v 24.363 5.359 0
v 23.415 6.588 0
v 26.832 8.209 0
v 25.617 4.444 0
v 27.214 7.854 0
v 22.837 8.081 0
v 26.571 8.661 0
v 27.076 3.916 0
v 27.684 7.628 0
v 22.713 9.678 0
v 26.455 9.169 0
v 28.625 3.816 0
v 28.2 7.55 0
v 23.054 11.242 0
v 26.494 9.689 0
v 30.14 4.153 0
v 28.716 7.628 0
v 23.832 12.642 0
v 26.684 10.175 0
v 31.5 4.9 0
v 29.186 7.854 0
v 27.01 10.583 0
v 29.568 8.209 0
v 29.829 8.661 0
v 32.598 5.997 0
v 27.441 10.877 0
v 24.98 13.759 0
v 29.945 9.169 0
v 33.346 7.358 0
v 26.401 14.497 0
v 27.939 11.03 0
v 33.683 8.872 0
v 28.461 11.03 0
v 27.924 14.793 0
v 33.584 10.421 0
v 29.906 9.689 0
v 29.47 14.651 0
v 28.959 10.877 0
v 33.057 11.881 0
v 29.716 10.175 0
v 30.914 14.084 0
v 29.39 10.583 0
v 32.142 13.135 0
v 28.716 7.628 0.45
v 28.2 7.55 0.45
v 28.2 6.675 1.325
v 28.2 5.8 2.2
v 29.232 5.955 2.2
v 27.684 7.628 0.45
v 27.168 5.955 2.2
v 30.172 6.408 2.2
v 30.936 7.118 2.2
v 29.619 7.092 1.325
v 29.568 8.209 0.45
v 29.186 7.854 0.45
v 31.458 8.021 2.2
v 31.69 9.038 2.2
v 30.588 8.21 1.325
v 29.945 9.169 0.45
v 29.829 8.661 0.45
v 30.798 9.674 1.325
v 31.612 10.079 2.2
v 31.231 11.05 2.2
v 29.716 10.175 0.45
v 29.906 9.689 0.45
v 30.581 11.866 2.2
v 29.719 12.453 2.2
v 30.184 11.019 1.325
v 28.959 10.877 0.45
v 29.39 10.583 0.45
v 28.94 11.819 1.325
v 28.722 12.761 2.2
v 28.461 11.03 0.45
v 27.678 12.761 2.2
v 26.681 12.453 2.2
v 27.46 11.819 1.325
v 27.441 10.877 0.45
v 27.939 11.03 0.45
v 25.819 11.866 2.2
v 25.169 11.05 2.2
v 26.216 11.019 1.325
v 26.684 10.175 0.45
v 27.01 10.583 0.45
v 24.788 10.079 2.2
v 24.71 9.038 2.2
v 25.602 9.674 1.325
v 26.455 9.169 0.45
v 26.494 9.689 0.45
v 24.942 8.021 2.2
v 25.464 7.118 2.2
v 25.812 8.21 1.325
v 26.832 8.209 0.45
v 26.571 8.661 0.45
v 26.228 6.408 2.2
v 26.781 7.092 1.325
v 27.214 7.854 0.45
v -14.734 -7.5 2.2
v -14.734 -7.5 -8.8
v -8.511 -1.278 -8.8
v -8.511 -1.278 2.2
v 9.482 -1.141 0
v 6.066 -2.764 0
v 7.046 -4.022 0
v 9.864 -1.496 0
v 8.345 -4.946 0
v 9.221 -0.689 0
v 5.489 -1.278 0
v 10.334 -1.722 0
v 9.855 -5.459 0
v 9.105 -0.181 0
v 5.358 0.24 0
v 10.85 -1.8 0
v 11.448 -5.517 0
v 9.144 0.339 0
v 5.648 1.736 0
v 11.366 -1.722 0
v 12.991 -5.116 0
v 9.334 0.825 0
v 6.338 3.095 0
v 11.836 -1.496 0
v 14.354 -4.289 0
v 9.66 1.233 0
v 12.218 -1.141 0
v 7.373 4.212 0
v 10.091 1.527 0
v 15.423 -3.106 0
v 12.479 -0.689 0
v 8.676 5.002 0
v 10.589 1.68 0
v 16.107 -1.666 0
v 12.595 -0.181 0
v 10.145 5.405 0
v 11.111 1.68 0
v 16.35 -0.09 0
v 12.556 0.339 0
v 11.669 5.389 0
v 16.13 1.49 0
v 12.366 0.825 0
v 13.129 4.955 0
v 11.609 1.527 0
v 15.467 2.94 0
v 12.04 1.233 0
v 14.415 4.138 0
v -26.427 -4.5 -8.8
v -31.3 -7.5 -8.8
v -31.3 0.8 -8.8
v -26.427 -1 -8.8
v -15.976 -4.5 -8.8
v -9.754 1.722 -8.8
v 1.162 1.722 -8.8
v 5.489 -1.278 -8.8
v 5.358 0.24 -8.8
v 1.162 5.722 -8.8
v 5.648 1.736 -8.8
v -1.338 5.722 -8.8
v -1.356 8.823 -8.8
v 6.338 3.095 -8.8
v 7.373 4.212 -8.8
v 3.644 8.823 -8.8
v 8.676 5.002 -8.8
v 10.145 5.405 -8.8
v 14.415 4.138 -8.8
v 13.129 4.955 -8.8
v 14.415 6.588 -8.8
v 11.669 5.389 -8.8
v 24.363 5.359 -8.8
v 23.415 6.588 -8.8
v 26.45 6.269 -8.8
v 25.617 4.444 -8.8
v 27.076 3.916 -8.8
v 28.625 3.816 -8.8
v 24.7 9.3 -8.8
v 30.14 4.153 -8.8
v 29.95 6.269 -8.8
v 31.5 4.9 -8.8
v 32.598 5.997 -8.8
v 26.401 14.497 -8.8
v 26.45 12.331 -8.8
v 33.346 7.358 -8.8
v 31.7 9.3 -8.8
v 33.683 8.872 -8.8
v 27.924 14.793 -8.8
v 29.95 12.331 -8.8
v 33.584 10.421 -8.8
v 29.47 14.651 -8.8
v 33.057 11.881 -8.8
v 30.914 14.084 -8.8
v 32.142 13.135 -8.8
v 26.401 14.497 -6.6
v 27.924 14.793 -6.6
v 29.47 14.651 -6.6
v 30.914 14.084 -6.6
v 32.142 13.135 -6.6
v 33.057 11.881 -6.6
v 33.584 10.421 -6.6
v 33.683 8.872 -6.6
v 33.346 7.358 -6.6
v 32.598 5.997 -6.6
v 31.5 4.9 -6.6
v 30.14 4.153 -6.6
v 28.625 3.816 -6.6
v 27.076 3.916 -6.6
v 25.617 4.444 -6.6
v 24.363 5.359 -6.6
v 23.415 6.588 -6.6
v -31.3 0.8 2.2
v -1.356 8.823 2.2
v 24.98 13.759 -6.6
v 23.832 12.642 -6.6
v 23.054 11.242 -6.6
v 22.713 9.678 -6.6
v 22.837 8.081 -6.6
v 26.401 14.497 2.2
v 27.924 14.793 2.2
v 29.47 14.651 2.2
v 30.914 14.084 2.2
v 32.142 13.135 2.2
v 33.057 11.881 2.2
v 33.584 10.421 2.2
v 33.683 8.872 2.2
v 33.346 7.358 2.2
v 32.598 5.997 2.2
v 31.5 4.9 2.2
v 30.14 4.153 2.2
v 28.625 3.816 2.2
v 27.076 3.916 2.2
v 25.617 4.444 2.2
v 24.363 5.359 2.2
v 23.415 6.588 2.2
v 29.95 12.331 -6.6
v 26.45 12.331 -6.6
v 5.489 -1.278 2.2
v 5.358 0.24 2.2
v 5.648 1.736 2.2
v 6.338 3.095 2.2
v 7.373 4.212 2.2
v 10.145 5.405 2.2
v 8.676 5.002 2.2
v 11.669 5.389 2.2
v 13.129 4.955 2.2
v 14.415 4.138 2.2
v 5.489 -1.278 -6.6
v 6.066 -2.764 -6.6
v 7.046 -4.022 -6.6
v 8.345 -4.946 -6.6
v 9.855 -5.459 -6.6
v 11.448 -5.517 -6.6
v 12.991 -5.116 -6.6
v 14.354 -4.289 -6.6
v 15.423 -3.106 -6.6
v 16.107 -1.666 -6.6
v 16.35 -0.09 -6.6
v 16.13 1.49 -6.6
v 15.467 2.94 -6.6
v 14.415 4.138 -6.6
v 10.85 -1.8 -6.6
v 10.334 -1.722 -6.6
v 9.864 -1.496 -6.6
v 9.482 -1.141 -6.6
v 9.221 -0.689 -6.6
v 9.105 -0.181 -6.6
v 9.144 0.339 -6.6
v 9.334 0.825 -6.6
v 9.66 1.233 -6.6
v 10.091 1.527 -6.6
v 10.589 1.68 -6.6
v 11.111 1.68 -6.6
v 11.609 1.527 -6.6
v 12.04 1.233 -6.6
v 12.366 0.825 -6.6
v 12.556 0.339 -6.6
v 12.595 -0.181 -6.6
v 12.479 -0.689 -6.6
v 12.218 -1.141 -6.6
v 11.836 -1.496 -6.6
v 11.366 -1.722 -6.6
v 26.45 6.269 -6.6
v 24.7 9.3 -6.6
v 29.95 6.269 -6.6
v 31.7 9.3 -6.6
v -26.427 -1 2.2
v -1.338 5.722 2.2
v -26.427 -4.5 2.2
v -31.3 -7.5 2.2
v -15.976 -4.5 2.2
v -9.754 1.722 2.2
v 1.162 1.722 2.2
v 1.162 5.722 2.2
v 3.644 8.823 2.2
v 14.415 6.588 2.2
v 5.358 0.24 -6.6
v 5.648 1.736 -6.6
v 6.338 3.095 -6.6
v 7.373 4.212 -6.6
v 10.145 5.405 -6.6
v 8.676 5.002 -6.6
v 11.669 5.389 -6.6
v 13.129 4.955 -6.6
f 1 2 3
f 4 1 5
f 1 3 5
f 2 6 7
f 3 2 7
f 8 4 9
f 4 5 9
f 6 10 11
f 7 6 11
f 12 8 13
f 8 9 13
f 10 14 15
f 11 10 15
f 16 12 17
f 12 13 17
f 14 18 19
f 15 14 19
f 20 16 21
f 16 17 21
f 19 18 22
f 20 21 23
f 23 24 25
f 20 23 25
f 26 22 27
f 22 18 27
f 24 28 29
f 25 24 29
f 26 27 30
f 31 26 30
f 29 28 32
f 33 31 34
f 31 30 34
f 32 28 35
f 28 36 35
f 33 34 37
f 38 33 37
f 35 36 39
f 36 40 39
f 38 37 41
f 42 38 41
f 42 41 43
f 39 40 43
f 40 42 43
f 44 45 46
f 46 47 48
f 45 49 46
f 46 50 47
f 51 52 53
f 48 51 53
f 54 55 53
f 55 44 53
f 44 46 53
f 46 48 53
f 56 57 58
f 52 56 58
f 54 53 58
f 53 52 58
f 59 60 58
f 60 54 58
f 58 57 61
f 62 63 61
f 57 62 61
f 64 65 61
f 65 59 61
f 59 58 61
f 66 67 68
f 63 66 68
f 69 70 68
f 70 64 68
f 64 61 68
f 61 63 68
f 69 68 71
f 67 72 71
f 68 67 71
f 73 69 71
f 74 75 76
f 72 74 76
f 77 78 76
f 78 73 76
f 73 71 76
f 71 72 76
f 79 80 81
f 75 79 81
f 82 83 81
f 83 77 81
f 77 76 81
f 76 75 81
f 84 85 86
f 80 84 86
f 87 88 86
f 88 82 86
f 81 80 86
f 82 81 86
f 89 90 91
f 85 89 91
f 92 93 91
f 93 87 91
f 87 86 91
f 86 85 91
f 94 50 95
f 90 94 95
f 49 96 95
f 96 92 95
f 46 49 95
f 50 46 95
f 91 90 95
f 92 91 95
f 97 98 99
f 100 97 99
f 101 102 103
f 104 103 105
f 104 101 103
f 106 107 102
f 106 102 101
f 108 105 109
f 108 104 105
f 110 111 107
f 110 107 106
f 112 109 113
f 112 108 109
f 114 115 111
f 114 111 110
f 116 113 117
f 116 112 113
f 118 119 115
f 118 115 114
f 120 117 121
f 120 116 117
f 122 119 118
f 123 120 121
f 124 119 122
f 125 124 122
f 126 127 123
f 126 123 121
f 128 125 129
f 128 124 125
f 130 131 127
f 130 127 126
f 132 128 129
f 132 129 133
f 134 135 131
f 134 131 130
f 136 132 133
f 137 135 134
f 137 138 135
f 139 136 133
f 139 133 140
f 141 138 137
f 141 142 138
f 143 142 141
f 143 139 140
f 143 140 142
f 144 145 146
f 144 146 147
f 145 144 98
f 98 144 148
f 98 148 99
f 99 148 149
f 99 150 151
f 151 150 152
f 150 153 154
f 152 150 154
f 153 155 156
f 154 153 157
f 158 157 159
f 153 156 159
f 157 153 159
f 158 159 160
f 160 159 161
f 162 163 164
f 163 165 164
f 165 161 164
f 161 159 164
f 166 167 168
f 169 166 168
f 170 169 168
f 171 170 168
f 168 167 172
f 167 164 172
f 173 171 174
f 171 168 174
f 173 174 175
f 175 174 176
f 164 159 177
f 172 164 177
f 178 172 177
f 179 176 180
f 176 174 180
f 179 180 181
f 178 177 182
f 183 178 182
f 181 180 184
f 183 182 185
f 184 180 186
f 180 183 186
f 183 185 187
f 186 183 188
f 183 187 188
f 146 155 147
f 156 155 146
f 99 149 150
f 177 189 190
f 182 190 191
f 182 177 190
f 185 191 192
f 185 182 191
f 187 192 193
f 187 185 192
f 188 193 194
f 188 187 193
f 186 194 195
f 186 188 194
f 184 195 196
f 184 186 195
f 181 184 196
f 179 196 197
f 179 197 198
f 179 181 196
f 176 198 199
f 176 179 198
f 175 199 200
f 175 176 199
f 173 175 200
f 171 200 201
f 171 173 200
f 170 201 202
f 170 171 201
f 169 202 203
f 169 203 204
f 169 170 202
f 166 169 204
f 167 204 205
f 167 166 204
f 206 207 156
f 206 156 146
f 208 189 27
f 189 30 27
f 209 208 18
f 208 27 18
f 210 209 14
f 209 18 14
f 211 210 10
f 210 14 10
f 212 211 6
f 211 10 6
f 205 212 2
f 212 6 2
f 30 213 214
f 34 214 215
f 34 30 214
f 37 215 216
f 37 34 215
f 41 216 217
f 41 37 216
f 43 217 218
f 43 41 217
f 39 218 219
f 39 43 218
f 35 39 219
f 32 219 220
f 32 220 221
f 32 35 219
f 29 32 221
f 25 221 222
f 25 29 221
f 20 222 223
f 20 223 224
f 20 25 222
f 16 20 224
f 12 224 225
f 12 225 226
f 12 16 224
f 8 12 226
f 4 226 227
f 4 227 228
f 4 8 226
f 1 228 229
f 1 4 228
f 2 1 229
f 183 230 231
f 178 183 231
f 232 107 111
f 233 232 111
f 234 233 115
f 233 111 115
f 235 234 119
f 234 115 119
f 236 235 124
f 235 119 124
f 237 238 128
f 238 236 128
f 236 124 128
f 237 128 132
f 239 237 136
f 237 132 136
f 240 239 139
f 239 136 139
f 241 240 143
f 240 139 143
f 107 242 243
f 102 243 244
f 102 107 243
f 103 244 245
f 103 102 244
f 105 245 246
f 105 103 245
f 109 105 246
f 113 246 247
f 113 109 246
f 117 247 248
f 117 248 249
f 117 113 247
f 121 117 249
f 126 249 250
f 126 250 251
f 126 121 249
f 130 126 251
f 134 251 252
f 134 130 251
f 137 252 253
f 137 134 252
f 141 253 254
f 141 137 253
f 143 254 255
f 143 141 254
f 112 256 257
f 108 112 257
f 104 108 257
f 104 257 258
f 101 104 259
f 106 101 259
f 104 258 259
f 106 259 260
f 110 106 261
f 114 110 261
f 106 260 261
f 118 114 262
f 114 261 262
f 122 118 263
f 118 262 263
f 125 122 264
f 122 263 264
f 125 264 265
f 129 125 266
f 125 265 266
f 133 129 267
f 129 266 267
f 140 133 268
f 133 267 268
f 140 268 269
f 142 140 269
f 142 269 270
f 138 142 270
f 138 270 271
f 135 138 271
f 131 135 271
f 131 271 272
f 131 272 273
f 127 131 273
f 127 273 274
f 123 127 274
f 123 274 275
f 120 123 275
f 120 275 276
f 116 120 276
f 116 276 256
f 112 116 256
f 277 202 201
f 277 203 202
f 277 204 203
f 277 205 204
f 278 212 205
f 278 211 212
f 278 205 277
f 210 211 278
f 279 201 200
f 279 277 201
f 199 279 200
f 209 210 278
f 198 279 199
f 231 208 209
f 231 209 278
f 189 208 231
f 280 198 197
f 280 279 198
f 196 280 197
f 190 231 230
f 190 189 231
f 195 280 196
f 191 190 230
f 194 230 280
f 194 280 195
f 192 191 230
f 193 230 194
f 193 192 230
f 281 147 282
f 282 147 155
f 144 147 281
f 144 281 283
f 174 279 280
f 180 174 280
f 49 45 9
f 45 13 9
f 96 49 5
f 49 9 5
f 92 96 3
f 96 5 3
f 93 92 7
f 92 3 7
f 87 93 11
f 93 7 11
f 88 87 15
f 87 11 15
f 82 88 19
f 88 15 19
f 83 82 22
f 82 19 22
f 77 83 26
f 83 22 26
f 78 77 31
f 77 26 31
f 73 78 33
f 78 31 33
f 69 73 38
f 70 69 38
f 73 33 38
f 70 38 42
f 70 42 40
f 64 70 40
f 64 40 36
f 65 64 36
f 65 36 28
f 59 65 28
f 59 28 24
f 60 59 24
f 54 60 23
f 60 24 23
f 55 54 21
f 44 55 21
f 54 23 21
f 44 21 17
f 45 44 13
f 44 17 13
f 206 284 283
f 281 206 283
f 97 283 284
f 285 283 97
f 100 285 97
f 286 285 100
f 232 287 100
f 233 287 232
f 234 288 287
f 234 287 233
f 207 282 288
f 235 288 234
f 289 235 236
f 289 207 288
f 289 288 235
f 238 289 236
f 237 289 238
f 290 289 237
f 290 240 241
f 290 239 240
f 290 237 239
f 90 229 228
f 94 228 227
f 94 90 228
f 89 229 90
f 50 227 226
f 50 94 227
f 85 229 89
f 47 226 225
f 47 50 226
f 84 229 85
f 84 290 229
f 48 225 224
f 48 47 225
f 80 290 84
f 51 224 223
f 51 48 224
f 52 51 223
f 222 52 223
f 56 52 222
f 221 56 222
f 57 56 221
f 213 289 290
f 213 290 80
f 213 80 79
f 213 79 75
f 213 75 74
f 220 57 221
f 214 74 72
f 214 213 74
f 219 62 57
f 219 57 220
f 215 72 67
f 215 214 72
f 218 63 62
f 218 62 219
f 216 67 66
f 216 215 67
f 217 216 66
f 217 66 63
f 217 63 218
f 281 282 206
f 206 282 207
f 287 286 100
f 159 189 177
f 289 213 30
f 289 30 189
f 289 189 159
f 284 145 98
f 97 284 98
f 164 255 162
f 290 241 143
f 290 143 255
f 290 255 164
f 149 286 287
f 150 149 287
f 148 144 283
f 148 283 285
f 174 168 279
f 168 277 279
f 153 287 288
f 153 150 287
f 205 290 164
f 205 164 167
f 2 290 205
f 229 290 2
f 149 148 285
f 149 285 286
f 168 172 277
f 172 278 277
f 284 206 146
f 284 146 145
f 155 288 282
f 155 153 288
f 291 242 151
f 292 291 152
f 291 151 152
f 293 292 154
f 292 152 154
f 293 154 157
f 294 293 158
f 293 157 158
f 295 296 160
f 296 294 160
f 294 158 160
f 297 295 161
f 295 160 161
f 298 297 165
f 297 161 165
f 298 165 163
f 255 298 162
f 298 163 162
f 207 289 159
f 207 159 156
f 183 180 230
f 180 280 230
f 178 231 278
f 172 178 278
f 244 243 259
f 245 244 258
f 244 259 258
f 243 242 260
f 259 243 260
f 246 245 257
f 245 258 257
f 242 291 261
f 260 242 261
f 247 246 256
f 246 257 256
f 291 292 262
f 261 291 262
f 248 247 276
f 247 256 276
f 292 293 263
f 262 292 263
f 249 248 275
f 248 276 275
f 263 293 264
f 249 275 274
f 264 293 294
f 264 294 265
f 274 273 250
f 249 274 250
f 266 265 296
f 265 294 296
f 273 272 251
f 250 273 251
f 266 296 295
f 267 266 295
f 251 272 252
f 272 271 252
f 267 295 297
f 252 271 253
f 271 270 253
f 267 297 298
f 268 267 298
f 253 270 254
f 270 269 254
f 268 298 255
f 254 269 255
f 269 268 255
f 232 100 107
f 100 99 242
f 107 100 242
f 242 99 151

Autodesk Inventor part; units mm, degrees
ref_plane "YZ Plane" through (0, 0, 0) normal (1, 0, 0) x (0, 1, 0)
ref_plane "XZ Plane" through (0, 0, 0) normal (0, 1, 0) x (-1, 0, 0)
ref_plane "XY Plane" through (0, 0, 0) normal (0, 0, 1) x (1, 0, 0)
sketch "Esboço1" plane through (0, 0, 0) normal (0, 0, 1) x (1, 0, 0)
  circle A0 centre (28.2, 9.3) radius 5.5
  line L0 (-31.3, -7.5) -> (33.7, -7.5) construction
  line L1 (33.7, -7.5) -> (33.7, 14.8) construction
  line L2 (33.7, 14.8) -> (-31.3, 14.8) construction
  line L3 (-31.3, 14.8) -> (-31.3, -7.5) construction
  circle A1 centre (10.85, -0.05) radius 5.5
  line L4 (-14.7338, -7.5) -> (-8.5113, -1.2775)
  line L5 (-31.3, -7.5) -> (-14.7338, -7.5)
  line L6 (-8.5113, -1.2775) -> (5.4887, -1.2775)
  line L7 (-31.3, -7.5) -> (-31.3, 0.8)
  line L8 (-31.3, 0.8) -> (-1.3563, 8.8234)
  line L9 (-1.3563, 8.8234) -> (3.6437, 8.8234)
  line L10 (3.6437, 8.8234) -> (26.4006, 14.4973)
  line L11 (14.415, 4.1381) -> (14.415, 6.5881)
  line L12 (14.415, 6.5881) -> (23.415, 6.5881)
  line L13 (-26.4266, -1) -> (-26.4266, -4.5)
  line L14 (-26.4266, -4.5) -> (-15.9765, -4.5)
  line L15 (-26.4266, -1) -> (-1.3377, 5.7225)
  line L16 (-15.9765, -4.5) -> (-9.7539, 1.7225)
  line L17 (-9.7539, 1.7225) -> (1.1623, 1.7225)
  line L18 (1.1623, 1.7225) -> (1.1623, 5.7225)
  line L19 (1.1623, 5.7225) -> (-1.3377, 5.7225)
  point P0 (0, 0)
  dimension "d4" = 11
  dimension "d5" = 28.2
  dimension "d6" = 9.3
  dimension "d7" = 65
  dimension "d8" = 22.3
  dimension "d9" = 65
  dimension "d10" = 9.35
  dimension "d11" = 17.35
  dimension "d12" = 8.8
  dimension "d14" = 135
  dimension "d15" = 14
  dimension "d16" = 8.3
  dimension "d17" = 31
  dimension "d18" = 105
  dimension "d19" = 5
  dimension "d20" = 14
  dimension "d21" = 2.45
  dimension "d22" = 9
  dimension "d23" = 3
  dimension "d24" = 3
  dimension "d25" = 3.5
  dimension "d26" = 3
  dimension "d27" = 3
  dimension "d28" = 4
  dimension "d29" = 2.5
extrude "Extrusão1" add sketch "Esboço1" along normal blind 2.2 contours A0 L12 L11 A1 L6 L4 L5 L7 L8 L9 L10
extrude "Extrusão2" add sketch "Esboço1" against normal blind 6.6 contours A1
extrude "Extrusão3" add sketch "Esboço1" along normal blind 2.2 contours A0
sketch "Esboço2" plane through (0, 0, 0) normal (0, 0, 1) x (1, 0, 0)
  arc A0 (5.4887, -1.2775) -> (14.415, 4.1381) centre (10.85, -0.05) ccw projected
  point P0 (0, 0)
hole "Furo1" at (10.85, -0.05, 0) direction (0, 0, -1) diameter 3.5 end through all
sketch "Esboço3" plane through (0, 0, 2.2) normal (0, 0, 1) x (1, 0, 0)
  arc A0 (23.415, 6.5881) -> (26.4006, 14.4973) centre (28.2, 9.3) ccw projected
  point P0 (0, 0)
hole "Furo2" at (28.2, 9.3, 2.2) direction (0, 0, -1) diameter 3.5 end through all countersink diameter 7 countersink angle 90
pattern_linear "Padrão retangular3" count 2 spacing 8.8 along (0, 0, -1) of "Extrusão1", "Extrusão3"
sketch "Esboço6" plane through (-14.7338, -7.5, -8.8) normal (0, 0, -1) x (-1, 0, 0)
  circle A0 centre (-42.9338, 16.8) radius 3.5 projected
  line L0 (-41.1838, 13.7689) -> (-44.6838, 13.7689)
  line L1 (-44.6838, 13.7689) -> (-46.4338, 16.8)
  line L2 (-46.4338, 16.8) -> (-44.6838, 19.8311)
  line L3 (-44.6838, 19.8311) -> (-41.1838, 19.8311)
  line L4 (-41.1838, 19.8311) -> (-39.4338, 16.8)
  line L5 (-39.4338, 16.8) -> (-41.1838, 13.7689)
  point P0 (-14.7338, 7.5)
  point P1 (-42.9338, 16.8)
extrude "Extrusão6" cut sketch "Esboço6" along normal mid plane 4.4 contours L5 L0 L1 L2 L3 L4
sketch "Esboço4" plane through (0, 0, 0) normal (0, 0, -1) x (-1, 0, 0)
  line L0 (-26.4006, 14.4973) -> (-3.6437, 8.8234) projected
  line L1 (-26.4006, 14.4973) -> (-3.6437, 8.8234)
  line L2 (1.3563, 8.8234) -> (31.3, 0.8) projected
  line L3 (-3.6437, 8.8234) -> (1.3563, 8.8234)
  line L4 (1.3563, 8.8234) -> (31.3, 0.8)
  line L5 (31.3, 0.8) -> (31.3, -7.5)
  line L6 (31.3, -7.5) -> (14.7338, -7.5) projected
  line L7 (31.3, -7.5) -> (14.7338, -7.5)
  line L8 (14.7338, -7.5) -> (8.5113, -1.2775)
  line L9 (15.9765, -4.5) -> (9.7539, 1.7225) projected
  line L10 (8.5113, -1.2775) -> (-5.4887, -1.2775)
  arc A0 (-5.4887, -1.2775) -> (-14.415, 4.1381) centre (-10.85, -0.05) ccw projected
  arc A1 (-14.415, 4.1381) -> (-5.4887, -1.2775) centre (-10.85, -0.05) ccw
  line L11 (-14.415, 4.1381) -> (-14.415, 6.5881) projected
  line L12 (-14.415, 4.1381) -> (-14.415, 6.5881)
  line L13 (-14.415, 6.5881) -> (-23.415, 6.5881)
  line L14 (-14.415, 6.5881) -> (-23.415, 6.5881) projected
  arc A2 (-26.4006, 14.4973) -> (-23.415, 6.5881) centre (-28.2, 9.3) ccw construction
  arc A3 (-26.4006, 14.4973) -> (-23.415, 6.5881) centre (-28.2, 9.3) ccw projected
  arc A4 (-23.415, 6.5881) -> (-26.4006, 14.4973) centre (-28.2, 9.3) ccw
  line L15 (-1.1623, 5.7225) -> (1.3377, 5.7225) projected
  line L16 (-1.1623, 5.7225) -> (1.3377, 5.7225)
  line L17 (26.4266, -1) -> (1.3377, 5.7225) projected
  line L18 (1.3377, 5.7225) -> (26.4266, -1)
  line L19 (26.4266, -1) -> (26.4266, -4.5)
  line L20 (15.9765, -4.5) -> (26.4266, -4.5) projected
  line L21 (26.4266, -4.5) -> (15.9765, -4.5)
  line L22 (15.9765, -4.5) -> (9.7539, 1.7225)
  line L23 (9.7539, 1.7225) -> (-1.1623, 1.7225)
  line L24 (-1.1623, 1.7225) -> (-1.1623, 5.7225)
  point P0 (0, 0)
  point P1 (-5.4887, -1.2775)
extrude "Extrusão7" add sketch "Esboço4" along normal blind 6.6 contours L0 L3 L2 L5 L6 L8 L10 A0 L11 L13 A4
properties part number "Pinza_0002_001" material "Borracha"
